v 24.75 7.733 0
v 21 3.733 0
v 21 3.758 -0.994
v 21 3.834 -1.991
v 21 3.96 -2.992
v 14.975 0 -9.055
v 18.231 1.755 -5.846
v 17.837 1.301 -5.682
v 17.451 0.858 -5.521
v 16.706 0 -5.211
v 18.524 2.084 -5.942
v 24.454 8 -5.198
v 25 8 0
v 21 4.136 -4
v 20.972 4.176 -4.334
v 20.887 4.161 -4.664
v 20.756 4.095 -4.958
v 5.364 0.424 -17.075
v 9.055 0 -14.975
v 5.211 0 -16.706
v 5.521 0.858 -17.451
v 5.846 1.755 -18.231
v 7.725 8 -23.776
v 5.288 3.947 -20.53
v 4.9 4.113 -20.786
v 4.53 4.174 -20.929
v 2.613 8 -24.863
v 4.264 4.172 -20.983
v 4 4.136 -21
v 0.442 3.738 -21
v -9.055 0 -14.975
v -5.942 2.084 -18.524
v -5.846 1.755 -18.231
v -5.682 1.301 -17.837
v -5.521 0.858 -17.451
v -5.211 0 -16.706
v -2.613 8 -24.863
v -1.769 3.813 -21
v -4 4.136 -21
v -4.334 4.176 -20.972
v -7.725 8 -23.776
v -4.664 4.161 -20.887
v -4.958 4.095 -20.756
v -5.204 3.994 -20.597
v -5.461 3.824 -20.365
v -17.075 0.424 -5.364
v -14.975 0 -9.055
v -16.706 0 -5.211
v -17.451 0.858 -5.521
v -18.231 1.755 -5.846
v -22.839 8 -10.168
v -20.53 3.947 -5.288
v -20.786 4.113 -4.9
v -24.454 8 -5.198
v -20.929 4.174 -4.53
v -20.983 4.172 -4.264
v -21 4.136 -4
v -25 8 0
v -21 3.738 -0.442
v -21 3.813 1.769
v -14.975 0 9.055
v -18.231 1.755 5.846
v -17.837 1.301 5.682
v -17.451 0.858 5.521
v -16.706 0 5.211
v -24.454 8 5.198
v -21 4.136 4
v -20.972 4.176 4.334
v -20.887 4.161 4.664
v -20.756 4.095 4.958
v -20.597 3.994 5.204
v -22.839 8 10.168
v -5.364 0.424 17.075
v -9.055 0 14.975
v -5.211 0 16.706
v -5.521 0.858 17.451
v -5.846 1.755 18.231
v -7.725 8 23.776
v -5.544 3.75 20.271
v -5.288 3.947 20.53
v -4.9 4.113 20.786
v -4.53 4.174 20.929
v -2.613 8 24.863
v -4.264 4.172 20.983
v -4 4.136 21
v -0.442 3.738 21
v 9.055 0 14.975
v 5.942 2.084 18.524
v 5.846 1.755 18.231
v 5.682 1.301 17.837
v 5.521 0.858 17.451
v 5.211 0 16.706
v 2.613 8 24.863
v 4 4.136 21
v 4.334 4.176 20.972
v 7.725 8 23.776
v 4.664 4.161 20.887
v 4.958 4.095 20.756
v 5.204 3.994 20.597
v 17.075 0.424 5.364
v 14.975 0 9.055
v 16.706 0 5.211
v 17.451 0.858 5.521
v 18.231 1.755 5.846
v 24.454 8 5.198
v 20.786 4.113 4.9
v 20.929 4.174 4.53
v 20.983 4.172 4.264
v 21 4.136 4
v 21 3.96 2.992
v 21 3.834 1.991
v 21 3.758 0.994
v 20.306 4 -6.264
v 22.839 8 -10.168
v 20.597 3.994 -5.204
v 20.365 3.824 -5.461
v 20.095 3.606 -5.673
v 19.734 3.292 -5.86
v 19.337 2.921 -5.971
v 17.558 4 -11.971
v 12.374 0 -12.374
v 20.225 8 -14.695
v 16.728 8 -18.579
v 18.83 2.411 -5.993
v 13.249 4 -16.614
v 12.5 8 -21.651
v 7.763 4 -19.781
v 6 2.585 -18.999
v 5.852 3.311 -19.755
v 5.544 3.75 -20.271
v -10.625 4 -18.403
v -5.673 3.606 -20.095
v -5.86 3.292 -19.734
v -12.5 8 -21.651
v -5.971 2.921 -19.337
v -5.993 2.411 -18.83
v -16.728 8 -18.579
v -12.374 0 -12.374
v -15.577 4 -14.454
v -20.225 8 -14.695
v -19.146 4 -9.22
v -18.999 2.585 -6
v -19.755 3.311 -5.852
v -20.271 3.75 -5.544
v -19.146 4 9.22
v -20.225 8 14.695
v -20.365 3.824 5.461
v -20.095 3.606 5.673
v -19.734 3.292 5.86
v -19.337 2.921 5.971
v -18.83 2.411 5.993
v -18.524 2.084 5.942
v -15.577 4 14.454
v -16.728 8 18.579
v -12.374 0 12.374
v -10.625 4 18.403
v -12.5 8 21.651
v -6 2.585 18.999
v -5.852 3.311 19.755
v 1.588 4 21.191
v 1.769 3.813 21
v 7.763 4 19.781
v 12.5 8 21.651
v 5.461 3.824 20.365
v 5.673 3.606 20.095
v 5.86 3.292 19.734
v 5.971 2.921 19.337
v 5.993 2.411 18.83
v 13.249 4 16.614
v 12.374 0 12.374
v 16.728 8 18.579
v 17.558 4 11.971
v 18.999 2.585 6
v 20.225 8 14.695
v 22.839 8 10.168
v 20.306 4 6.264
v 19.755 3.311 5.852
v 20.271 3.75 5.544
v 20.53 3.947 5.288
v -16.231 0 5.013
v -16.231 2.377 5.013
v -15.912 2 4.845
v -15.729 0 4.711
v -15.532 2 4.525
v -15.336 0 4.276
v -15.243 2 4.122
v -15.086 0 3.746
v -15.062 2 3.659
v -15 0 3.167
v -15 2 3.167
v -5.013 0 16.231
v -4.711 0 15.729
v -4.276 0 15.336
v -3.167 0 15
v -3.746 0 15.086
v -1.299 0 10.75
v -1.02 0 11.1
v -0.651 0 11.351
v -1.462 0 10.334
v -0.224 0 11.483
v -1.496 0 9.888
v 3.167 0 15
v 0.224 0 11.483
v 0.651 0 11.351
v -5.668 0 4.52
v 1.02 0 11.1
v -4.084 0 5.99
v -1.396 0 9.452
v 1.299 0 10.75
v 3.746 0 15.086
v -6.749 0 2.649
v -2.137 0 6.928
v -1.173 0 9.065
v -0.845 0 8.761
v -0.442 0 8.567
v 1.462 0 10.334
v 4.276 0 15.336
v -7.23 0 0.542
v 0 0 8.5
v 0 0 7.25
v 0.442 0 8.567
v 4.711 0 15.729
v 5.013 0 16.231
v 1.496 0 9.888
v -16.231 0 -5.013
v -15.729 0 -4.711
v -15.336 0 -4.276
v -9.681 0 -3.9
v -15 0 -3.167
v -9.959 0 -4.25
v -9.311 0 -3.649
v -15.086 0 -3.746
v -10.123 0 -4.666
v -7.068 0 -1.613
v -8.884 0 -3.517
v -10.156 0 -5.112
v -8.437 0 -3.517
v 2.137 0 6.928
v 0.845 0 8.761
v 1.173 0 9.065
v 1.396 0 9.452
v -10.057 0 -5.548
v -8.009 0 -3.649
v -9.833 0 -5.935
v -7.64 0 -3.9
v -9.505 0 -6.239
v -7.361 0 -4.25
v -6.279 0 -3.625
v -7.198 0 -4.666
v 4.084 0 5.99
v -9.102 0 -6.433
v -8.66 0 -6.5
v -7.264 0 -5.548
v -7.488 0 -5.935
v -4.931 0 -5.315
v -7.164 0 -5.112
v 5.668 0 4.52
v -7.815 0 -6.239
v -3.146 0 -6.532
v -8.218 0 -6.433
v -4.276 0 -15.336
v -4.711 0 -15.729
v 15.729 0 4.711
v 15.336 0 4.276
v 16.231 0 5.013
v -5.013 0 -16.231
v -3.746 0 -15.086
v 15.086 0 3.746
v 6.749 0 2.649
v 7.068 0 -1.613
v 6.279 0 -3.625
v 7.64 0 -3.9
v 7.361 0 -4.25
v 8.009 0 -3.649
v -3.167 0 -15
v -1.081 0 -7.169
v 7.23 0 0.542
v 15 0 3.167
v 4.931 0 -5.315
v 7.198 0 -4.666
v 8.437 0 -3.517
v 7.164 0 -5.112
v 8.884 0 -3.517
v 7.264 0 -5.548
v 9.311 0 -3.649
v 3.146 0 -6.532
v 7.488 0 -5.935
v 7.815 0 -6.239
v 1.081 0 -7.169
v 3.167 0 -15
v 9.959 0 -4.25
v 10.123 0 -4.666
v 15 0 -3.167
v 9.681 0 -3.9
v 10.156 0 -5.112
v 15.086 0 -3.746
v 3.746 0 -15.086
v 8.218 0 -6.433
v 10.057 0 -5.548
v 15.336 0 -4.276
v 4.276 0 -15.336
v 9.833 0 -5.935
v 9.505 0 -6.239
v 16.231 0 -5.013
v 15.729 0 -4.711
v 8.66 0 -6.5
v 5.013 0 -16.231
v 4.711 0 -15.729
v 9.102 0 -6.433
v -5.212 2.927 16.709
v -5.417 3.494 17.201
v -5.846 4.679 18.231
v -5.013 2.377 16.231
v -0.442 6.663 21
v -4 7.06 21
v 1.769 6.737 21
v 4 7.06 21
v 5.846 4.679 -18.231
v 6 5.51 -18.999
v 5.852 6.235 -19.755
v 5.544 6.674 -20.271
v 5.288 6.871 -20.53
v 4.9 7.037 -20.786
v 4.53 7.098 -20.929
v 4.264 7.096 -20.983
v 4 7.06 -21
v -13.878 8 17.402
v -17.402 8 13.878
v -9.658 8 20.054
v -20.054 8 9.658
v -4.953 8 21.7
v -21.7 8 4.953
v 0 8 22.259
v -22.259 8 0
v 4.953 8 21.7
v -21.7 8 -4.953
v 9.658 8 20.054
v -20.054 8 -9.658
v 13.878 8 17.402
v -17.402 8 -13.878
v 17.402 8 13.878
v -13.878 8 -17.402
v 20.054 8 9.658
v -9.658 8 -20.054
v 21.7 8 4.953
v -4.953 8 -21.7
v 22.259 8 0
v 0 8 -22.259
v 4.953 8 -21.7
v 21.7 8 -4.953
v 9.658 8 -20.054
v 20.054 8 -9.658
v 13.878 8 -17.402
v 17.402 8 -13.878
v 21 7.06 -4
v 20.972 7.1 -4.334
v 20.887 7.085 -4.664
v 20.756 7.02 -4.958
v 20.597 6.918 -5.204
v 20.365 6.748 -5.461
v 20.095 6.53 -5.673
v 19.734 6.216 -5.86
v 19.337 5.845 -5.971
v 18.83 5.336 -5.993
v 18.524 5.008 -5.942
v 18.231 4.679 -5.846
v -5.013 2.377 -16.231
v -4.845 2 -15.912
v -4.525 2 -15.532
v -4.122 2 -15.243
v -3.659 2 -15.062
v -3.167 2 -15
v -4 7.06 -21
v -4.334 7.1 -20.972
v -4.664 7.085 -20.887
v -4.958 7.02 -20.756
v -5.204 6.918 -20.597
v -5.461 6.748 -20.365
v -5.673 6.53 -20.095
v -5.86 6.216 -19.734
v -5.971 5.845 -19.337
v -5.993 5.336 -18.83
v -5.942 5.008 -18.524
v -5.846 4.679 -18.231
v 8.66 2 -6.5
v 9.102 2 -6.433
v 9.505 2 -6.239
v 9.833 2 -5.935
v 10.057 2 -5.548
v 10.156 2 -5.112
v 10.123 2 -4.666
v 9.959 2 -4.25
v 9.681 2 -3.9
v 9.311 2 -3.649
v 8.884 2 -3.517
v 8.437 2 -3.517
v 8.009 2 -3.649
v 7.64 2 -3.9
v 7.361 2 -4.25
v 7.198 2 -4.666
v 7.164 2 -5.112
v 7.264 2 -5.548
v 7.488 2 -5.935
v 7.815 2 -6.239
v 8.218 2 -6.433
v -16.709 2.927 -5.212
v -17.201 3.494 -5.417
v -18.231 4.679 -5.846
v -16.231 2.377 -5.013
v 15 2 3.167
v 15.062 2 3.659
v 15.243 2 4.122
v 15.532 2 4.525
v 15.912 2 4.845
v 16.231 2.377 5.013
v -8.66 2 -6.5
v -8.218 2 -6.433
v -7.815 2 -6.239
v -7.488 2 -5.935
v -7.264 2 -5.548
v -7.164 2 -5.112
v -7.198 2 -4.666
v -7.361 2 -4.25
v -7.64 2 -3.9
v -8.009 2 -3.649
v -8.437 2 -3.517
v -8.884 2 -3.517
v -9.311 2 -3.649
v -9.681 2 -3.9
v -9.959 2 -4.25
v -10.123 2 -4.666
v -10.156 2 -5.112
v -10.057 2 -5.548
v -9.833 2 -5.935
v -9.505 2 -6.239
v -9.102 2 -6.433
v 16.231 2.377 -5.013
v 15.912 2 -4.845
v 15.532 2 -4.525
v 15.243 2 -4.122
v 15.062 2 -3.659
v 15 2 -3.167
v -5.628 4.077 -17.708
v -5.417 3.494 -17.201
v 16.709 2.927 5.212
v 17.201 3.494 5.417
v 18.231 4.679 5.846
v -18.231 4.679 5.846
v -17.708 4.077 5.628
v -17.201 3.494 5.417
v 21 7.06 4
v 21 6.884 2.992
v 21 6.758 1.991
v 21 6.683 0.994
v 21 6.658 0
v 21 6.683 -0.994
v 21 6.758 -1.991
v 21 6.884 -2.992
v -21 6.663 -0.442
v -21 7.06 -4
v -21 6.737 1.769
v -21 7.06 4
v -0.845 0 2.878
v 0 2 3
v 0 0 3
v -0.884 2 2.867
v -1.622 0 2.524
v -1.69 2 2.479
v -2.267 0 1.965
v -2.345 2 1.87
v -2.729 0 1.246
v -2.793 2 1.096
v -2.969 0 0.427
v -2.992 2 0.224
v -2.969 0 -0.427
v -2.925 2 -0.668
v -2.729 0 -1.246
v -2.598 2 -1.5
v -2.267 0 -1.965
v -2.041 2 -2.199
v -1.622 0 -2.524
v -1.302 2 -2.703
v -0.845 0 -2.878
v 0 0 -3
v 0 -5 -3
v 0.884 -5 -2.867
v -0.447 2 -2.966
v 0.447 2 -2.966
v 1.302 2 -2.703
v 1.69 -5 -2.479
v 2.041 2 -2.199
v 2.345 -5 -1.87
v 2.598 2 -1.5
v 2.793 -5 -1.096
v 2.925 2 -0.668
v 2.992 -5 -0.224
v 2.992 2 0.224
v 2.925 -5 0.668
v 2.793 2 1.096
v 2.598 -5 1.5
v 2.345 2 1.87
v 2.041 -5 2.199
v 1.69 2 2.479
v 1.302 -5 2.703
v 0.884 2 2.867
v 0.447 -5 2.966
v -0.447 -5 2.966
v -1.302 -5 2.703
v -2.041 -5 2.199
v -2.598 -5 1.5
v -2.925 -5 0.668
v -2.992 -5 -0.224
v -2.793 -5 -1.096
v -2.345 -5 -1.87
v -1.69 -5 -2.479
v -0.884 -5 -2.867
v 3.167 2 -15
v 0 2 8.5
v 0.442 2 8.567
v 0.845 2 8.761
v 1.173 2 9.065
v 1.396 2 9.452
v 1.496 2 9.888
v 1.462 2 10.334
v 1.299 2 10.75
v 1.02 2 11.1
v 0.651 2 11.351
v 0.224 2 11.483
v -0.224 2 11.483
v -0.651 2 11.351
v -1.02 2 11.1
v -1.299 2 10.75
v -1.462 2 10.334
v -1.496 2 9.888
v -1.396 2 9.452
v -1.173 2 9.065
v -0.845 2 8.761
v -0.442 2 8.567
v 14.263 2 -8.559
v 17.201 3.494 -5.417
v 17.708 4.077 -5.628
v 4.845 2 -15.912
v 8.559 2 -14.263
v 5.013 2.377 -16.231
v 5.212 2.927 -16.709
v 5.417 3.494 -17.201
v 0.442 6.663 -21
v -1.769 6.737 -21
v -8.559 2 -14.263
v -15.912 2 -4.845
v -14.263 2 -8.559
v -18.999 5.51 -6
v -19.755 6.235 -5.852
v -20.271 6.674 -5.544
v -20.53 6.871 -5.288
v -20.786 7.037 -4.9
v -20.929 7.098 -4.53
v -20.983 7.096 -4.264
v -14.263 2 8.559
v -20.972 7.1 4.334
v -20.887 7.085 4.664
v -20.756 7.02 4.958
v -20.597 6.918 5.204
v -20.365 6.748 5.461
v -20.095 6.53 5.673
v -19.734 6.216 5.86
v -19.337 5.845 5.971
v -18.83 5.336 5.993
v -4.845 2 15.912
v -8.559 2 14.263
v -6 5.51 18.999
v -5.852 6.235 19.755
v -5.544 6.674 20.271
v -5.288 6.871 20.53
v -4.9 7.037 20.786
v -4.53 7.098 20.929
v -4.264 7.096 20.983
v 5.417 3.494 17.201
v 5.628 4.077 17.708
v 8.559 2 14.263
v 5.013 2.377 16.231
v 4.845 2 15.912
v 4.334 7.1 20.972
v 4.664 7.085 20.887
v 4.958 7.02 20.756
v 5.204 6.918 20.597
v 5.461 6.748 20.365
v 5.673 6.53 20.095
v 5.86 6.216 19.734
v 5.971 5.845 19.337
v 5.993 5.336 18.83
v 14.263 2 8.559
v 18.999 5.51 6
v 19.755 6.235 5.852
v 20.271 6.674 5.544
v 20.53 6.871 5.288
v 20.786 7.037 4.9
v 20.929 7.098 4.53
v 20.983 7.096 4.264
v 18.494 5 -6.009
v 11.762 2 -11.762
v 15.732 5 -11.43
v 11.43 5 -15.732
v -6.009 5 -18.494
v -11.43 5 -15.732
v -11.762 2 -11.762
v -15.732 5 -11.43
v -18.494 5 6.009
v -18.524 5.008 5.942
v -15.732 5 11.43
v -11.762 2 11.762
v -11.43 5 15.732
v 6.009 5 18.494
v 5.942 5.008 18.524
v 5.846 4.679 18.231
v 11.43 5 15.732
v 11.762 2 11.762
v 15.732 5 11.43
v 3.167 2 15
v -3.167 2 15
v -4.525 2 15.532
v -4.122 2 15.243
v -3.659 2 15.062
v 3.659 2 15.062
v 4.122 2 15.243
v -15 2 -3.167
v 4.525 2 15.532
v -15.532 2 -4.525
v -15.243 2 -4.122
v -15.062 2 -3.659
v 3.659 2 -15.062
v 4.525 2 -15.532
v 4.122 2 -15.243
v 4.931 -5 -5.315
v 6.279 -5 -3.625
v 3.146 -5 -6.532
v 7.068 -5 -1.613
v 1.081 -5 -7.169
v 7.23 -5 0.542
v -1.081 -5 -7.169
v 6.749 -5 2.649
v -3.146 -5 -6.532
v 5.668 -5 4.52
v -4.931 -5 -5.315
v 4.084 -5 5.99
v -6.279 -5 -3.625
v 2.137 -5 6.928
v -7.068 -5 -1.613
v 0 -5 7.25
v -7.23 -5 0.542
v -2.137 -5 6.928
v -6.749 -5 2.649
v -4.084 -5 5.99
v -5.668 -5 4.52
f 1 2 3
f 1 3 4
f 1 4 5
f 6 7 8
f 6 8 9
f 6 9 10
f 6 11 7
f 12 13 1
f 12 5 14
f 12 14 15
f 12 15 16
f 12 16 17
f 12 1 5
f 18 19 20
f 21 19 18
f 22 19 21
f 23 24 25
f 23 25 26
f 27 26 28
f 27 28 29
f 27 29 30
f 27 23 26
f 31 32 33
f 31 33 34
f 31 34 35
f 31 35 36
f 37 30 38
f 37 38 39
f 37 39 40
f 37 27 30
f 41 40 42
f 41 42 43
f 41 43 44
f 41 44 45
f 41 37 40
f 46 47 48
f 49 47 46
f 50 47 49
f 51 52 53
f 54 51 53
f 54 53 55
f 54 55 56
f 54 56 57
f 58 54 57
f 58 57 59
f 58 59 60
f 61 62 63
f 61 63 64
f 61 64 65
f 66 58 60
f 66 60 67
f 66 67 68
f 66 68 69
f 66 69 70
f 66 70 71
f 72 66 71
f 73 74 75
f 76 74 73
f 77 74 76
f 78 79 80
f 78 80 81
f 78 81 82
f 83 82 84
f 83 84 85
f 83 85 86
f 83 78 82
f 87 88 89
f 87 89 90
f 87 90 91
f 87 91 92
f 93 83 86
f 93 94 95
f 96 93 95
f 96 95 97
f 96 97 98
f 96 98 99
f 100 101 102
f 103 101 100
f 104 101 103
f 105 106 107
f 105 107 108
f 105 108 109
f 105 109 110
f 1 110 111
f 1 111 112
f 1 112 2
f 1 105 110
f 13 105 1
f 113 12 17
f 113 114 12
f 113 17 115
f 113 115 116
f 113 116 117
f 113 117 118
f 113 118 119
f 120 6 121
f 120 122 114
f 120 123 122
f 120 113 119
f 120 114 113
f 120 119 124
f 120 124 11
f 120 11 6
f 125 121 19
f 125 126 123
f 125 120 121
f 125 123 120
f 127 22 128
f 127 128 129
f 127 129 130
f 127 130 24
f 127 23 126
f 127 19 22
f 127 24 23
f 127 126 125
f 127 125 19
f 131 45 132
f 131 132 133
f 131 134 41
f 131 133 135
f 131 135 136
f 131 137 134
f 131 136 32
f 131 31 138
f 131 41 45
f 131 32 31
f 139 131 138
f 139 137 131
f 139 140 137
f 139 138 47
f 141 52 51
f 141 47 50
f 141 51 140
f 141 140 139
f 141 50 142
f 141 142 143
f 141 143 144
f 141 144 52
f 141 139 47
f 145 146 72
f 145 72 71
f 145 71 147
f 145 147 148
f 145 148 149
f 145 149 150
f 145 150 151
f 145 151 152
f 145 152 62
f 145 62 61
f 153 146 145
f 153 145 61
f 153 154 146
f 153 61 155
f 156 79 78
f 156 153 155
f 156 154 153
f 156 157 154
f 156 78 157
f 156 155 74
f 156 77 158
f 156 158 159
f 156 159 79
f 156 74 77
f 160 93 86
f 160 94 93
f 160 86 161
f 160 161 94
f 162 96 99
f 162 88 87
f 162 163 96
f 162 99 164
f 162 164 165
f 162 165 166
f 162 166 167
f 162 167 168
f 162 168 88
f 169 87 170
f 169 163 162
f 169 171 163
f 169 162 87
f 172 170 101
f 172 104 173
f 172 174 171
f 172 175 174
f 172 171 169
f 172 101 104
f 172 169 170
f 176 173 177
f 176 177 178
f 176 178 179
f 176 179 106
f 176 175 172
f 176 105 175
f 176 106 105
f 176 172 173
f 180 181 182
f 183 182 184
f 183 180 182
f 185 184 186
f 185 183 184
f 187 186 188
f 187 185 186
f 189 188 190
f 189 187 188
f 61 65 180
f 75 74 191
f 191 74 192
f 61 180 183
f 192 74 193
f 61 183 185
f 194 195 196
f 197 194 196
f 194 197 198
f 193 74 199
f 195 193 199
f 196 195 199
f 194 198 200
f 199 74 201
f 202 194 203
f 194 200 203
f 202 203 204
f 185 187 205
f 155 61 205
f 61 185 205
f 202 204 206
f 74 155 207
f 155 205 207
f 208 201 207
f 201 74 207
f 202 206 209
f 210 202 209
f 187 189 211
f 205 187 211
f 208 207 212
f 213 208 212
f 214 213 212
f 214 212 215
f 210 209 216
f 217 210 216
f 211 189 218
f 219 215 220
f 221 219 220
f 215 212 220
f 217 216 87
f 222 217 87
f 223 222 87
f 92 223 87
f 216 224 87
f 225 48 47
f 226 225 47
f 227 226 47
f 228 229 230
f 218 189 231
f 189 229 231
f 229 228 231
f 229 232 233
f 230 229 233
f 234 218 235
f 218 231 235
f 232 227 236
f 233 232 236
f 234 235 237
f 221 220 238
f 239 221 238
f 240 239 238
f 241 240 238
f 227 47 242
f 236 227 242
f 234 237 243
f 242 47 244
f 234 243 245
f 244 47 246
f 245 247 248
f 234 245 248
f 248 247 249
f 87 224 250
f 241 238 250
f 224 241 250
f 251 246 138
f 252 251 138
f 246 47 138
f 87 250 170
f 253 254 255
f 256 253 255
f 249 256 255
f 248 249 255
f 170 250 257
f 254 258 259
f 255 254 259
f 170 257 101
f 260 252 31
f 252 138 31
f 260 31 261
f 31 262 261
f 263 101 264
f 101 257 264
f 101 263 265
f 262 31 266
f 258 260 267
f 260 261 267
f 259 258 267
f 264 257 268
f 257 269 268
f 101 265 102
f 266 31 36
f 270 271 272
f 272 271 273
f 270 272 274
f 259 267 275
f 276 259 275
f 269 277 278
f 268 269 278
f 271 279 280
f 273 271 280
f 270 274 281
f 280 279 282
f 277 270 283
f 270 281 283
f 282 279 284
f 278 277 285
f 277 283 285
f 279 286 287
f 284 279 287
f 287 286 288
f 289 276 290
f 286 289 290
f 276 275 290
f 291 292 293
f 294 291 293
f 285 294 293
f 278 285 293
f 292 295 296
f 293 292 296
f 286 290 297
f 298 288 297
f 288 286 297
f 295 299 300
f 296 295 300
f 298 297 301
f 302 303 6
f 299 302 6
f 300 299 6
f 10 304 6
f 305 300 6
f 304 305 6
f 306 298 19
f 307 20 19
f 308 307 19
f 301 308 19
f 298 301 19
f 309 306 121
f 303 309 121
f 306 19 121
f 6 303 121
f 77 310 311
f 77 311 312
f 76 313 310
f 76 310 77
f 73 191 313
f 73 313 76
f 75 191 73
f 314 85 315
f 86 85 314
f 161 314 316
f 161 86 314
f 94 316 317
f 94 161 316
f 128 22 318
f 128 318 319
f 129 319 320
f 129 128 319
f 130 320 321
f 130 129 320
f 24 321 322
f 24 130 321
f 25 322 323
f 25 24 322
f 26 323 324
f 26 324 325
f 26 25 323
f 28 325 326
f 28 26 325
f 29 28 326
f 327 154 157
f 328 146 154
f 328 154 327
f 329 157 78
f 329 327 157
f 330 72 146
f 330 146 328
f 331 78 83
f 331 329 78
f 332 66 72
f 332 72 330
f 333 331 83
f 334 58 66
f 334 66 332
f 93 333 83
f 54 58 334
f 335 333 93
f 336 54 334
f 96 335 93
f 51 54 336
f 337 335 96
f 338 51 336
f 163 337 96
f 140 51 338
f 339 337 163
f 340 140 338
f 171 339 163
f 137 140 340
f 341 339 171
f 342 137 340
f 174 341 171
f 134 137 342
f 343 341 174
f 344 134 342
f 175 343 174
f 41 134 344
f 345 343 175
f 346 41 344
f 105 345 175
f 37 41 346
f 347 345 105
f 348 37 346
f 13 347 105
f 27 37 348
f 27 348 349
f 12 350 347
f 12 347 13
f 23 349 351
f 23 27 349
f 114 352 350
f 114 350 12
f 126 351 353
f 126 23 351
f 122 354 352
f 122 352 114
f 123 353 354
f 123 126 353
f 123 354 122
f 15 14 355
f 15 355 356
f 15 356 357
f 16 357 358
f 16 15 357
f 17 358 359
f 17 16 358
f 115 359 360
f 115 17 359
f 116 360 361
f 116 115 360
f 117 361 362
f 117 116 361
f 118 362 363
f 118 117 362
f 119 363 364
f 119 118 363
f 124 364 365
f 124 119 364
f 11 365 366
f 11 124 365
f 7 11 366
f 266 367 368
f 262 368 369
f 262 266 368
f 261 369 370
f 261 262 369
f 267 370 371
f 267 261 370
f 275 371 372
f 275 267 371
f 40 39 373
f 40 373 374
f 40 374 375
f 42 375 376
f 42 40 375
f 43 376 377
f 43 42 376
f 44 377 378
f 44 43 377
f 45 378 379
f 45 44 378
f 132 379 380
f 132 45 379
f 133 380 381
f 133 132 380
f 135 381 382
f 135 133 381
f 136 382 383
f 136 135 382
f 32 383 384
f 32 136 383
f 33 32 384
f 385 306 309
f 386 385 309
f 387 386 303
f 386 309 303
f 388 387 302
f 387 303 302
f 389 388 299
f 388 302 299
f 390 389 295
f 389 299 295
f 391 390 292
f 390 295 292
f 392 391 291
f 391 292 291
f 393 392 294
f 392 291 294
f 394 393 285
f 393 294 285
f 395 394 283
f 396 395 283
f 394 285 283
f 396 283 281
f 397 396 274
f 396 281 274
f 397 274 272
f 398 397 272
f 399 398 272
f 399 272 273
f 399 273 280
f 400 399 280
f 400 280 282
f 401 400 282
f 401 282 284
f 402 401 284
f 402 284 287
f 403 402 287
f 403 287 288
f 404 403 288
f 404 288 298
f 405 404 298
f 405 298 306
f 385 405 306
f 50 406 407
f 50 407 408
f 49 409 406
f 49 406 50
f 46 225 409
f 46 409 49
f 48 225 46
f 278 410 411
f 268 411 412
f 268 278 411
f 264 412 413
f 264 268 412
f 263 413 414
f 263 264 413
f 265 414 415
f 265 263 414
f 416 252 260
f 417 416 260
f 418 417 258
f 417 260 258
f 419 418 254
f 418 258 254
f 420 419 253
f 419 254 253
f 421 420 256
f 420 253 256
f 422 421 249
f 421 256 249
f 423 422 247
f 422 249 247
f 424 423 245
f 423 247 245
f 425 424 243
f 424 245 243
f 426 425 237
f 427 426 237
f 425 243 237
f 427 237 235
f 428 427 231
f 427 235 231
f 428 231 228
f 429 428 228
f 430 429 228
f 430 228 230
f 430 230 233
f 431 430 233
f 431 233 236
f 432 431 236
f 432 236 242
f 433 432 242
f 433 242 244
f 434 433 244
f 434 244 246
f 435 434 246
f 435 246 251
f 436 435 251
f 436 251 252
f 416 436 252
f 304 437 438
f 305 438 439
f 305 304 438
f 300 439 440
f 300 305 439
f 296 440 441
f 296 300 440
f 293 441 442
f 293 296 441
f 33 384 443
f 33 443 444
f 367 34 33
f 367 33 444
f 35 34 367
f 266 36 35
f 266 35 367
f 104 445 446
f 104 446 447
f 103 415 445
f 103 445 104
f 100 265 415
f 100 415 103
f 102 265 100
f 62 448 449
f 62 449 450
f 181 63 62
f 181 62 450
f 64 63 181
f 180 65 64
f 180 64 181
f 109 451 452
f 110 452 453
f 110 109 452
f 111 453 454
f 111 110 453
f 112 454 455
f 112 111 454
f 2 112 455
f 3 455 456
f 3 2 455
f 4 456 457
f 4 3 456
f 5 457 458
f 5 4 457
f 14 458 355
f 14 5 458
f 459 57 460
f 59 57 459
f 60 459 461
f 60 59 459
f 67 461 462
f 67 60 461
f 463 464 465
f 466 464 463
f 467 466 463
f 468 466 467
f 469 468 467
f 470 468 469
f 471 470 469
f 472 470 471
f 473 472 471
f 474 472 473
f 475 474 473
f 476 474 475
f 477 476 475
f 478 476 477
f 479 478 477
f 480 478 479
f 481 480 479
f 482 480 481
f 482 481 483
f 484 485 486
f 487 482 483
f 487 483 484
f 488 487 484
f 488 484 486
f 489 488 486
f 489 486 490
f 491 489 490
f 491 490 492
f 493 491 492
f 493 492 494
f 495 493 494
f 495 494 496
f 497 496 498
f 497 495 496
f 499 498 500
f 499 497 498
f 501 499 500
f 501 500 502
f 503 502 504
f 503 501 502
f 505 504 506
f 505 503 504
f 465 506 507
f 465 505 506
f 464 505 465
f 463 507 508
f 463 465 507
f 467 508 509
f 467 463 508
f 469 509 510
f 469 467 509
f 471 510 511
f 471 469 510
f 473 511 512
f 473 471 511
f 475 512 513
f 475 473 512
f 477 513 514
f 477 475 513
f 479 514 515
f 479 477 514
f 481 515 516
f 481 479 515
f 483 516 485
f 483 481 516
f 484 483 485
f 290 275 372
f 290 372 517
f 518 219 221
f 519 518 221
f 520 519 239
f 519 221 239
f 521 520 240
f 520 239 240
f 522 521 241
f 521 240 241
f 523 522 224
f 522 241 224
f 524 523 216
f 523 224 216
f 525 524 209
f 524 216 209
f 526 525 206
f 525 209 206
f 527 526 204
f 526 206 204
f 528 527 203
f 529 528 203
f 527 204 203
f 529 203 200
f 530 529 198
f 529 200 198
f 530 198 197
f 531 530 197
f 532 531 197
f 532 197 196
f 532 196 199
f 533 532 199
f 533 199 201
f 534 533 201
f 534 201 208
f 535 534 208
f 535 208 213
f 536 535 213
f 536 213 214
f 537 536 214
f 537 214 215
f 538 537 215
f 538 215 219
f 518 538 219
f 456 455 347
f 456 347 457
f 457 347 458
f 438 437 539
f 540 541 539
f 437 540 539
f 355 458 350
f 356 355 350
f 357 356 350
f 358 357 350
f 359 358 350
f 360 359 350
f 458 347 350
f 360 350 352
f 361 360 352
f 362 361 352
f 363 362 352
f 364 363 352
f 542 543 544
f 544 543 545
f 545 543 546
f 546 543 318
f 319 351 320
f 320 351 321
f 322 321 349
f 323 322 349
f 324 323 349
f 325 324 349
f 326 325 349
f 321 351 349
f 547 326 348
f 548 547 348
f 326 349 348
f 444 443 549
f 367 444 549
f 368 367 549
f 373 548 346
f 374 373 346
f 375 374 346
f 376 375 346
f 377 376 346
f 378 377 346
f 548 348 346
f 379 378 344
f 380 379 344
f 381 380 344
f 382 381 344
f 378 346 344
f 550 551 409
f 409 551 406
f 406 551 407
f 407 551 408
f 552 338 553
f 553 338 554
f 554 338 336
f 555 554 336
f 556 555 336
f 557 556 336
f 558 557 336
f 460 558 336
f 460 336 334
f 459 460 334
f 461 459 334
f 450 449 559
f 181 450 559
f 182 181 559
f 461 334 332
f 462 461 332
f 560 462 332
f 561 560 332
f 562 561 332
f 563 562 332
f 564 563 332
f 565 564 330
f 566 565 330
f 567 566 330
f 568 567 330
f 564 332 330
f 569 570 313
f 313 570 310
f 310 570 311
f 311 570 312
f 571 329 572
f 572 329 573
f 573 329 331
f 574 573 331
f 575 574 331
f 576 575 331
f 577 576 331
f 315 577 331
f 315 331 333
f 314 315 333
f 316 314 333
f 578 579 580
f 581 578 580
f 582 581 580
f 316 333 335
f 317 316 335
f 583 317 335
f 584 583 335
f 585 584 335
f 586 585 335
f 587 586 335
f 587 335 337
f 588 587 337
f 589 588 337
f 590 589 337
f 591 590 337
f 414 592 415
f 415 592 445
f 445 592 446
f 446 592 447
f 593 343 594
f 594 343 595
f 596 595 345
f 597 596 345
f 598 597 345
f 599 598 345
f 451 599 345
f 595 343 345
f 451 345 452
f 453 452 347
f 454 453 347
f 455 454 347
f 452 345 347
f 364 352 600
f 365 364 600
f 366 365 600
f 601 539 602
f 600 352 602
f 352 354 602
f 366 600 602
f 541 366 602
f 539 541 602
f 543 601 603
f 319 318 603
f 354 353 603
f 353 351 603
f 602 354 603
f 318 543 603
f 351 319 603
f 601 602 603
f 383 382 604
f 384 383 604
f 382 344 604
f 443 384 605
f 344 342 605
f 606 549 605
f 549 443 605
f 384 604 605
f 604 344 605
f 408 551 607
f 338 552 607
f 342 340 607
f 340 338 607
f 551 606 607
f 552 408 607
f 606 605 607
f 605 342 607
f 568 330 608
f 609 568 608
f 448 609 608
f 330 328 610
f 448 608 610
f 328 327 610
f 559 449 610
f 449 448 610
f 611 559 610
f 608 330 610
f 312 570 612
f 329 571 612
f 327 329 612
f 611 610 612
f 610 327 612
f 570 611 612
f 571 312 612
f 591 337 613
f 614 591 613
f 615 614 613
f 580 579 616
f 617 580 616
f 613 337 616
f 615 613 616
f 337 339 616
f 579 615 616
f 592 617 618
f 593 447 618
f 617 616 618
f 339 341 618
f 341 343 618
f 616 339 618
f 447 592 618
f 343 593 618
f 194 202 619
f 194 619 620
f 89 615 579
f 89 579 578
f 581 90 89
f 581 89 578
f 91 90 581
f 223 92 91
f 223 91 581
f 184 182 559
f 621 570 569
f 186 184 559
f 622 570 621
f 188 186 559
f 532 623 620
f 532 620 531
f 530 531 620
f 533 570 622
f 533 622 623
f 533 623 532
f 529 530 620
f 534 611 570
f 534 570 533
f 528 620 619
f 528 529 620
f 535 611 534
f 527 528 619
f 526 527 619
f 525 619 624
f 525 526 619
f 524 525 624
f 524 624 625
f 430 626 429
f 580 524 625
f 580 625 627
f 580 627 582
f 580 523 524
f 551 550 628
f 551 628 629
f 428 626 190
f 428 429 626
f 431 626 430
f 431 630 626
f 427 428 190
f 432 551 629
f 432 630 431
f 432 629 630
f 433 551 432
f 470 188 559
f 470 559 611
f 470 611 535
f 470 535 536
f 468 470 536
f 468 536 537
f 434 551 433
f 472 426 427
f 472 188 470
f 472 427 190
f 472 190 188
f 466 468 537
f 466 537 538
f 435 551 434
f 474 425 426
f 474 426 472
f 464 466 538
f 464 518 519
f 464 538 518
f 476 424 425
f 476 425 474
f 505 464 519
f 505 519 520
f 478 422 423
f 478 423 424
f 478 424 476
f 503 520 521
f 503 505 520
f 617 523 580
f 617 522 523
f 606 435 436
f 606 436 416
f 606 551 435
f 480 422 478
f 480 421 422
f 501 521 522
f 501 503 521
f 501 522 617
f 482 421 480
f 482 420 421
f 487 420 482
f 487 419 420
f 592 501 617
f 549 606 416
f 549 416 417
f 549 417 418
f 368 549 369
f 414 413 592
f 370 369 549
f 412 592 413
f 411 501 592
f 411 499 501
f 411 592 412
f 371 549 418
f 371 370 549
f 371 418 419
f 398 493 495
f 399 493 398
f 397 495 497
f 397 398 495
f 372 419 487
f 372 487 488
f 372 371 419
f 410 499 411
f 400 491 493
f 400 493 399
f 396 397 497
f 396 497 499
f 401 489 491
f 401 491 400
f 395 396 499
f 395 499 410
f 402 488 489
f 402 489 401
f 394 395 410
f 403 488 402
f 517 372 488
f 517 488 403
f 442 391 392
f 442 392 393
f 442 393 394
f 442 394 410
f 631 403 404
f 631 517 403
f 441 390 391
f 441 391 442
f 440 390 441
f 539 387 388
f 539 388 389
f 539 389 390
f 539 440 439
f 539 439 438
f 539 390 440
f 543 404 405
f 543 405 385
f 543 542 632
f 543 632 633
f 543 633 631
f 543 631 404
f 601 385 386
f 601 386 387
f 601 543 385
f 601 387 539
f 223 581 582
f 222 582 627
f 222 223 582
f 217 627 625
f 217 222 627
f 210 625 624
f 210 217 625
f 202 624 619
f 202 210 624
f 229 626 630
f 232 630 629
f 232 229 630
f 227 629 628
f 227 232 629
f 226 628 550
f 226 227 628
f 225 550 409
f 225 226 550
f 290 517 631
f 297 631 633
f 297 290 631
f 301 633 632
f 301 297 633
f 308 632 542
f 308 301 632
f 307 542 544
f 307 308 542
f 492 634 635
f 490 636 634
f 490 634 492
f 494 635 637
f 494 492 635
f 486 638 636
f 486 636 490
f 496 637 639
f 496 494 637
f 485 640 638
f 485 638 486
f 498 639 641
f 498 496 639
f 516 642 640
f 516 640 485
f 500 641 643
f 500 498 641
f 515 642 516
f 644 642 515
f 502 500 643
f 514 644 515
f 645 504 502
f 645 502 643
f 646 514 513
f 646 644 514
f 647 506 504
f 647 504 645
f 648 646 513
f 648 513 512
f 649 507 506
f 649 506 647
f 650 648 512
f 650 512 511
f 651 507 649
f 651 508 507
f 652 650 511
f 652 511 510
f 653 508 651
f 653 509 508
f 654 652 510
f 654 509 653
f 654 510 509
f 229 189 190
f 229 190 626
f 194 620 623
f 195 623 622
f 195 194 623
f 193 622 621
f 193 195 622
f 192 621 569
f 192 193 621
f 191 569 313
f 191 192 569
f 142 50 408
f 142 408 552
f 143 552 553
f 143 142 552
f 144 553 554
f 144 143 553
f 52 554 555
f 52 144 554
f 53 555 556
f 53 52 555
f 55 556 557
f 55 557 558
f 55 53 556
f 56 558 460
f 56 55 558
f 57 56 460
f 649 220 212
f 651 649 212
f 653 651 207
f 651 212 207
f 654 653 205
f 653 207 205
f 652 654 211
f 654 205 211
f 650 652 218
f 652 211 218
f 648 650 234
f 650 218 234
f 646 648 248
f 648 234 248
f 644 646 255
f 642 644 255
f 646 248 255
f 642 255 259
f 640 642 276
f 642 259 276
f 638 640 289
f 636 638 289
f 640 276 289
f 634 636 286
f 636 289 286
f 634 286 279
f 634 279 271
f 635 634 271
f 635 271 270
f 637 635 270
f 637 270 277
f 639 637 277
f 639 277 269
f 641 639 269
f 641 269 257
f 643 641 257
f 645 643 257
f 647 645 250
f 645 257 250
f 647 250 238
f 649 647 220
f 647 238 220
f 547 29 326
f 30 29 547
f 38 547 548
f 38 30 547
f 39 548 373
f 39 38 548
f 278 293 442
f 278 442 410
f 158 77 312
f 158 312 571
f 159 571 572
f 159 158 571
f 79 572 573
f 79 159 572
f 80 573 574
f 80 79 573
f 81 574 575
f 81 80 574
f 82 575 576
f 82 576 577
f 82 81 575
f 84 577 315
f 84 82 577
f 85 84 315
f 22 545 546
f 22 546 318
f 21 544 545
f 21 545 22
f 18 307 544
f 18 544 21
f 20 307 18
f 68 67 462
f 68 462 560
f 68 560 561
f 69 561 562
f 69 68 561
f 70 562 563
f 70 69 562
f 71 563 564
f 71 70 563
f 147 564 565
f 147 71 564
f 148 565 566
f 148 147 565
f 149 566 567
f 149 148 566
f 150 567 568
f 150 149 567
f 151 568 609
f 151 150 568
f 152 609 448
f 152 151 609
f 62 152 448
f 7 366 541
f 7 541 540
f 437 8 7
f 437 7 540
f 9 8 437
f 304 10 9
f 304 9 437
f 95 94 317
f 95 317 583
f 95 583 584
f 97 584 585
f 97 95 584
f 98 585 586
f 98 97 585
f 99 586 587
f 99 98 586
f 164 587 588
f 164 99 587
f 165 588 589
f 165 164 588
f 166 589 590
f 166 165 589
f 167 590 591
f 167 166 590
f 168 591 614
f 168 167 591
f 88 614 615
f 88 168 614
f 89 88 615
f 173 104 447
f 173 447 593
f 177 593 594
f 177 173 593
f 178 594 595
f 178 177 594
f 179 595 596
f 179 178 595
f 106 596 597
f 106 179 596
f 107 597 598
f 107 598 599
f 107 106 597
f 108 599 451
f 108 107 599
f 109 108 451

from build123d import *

# Parameters (mm, degrees)
SKETCH1_R           = 17.5
SKETCH2_R           = 25
SHELL1_T            = -2
SKETCH3_R           = 7.25
SKETCH3_R_2         = 3
BOSS_EXTRUDE1_DEPTH = 5
CUT_EXTRUDE1_START  = -5
SKETCH4_R           = 3
CUT_EXTRUDE1_DEPTH  = 5
SKETCH5_R           = 1.5
CUT_EXTRUDE2_DEPTH  = 37.249138081
CUT_EXTRUDE3_DEPTH  = 15


with BuildPart() as part:
    # Sketch1 → Loft1 section 0
    with BuildSketch(Plane(origin=(0, 0, 0), x_dir=(1, 0, 0), z_dir=(0, 1, 0))):
        Circle(SKETCH1_R)
    # Sketch2 → Loft1 section 1
    with BuildSketch(Plane(origin=(0, 8, 0), x_dir=(1, 0, 0), z_dir=(0, 1, 0))):
        Circle(SKETCH2_R)
    loft()

    # Shell1
    shell1_openings = [part.faces().sort_by_distance(p)[0] for p in [
        (0, 8, 0),
    ]]
    offset(amount=SHELL1_T, openings=shell1_openings, kind=Kind.INTERSECTION)

    # Sketch3 → Boss-Extrude1 (add)
    with BuildSketch(Plane.XZ):
        with Locations(Location((0, 0, 0), (0, 0, 90))):
            Circle(SKETCH3_R)
        with Locations(Location((0, 0, 0), (0, 0, 270))):
            Circle(SKETCH3_R_2, mode=Mode.SUBTRACT)
    extrude(amount=BOSS_EXTRUDE1_DEPTH)

    # Sketch4 → Cut-Extrude1 (cut)
    with BuildSketch(Plane.XZ.offset(CUT_EXTRUDE1_START)):
        with Locations(Location((0, 0, 0), (0, 0, 90))):
            Circle(SKETCH4_R)
    extrude(amount=CUT_EXTRUDE1_DEPTH, mode=Mode.SUBTRACT)

    # Sketch5 → Cut-Extrude2 (cut, through all)
    with BuildSketch(Plane.XZ):
        with Locations(Location((0, 10, 0), (0, 0, 270))):
            Circle(SKETCH5_R)
        with Locations(Location((8.660254038, -5, 0), (0, 0, 270))):
            Circle(SKETCH5_R)
        with Locations(Location((-8.660254038, -5, 0), (0, 0, 270))):
            Circle(SKETCH5_R)
    extrude(amount=-CUT_EXTRUDE2_DEPTH, mode=Mode.SUBTRACT)

    # Sketch6 → Cut-Extrude3 (cut)
    with BuildSketch(Plane.XZ.offset(5)):
        with BuildLine():
            Line((-5.012820513, 16.230769231), (-5.846153846, 18.230769231))
            ThreePointArc((-5.846153846, 18.230769231), (-5.664100589, 20.109400392), (-4, 21))
            Line((-4, 21), (4, 21))
            ThreePointArc((4, 21), (5.664100589, 20.109400392), (5.846153846, 18.230769231))
            Line((5.846153846, 18.230769231), (5.012820513, 16.230769231))
            ThreePointArc((5.012820513, 16.230769231), (4.276067059, 15.335899411), (3.166666667, 15))
            Line((3.166666667, 15), (-3.166666667, 15))
            ThreePointArc((-3.166666667, 15), (-4.276067059, 15.335899411), (-5.012820513, 16.230769231))
        make_face()
        with BuildLine():
            Line((15, -3.166666667), (15, 3.166666667))
            ThreePointArc((15, 3.166666667), (15.335899411, 4.276067059), (16.230769231, 5.012820513))
            Line((16.230769231, 5.012820513), (18.230769231, 5.846153846))
            ThreePointArc((18.230769231, 5.846153846), (20.109400392, 5.664100589), (21, 4))
            Line((21, 4), (21, -4))
            ThreePointArc((21, -4), (20.109400392, -5.664100589), (18.230769231, -5.846153846))
            Line((18.230769231, -5.846153846), (16.230769231, -5.012820513))
            ThreePointArc((16.230769231, -5.012820513), (15.335899411, -4.276067059), (15, -3.166666667))
        make_face()
        with BuildLine():
            Line((-3.166666667, -15), (3.166666667, -15))
            ThreePointArc((3.166666667, -15), (4.276067059, -15.335899411), (5.012820513, -16.230769231))
            Line((5.012820513, -16.230769231), (5.846153846, -18.230769231))
            ThreePointArc((5.846153846, -18.230769231), (5.664100589, -20.109400392), (4, -21))
            Line((4, -21), (-4, -21))
            ThreePointArc((-4, -21), (-5.664100589, -20.109400392), (-5.846153846, -18.230769231))
            Line((-5.846153846, -18.230769231), (-5.012820513, -16.230769231))
            ThreePointArc((-5.012820513, -16.230769231), (-4.276067059, -15.335899411), (-3.166666667, -15))
        make_face()
        with BuildLine():
            Line((-15, 3.166666667), (-15, -3.166666667))
            ThreePointArc((-15, -3.166666667), (-15.335899411, -4.276067059), (-16.230769231, -5.012820513))
            Line((-16.230769231, -5.012820513), (-18.230769231, -5.846153846))
            ThreePointArc((-18.230769231, -5.846153846), (-20.109400392, -5.664100589), (-21, -4))
            Line((-21, -4), (-21, 4))
            ThreePointArc((-21, 4), (-20.109400392, 5.664100589), (-18.230769231, 5.846153846))
            Line((-18.230769231, 5.846153846), (-16.230769231, 5.012820513))
            ThreePointArc((-16.230769231, 5.012820513), (-15.335899411, 4.276067059), (-15, 3.166666667))
        make_face()
    extrude(amount=-CUT_EXTRUDE3_DEPTH, mode=Mode.SUBTRACT)


solid = part.part
